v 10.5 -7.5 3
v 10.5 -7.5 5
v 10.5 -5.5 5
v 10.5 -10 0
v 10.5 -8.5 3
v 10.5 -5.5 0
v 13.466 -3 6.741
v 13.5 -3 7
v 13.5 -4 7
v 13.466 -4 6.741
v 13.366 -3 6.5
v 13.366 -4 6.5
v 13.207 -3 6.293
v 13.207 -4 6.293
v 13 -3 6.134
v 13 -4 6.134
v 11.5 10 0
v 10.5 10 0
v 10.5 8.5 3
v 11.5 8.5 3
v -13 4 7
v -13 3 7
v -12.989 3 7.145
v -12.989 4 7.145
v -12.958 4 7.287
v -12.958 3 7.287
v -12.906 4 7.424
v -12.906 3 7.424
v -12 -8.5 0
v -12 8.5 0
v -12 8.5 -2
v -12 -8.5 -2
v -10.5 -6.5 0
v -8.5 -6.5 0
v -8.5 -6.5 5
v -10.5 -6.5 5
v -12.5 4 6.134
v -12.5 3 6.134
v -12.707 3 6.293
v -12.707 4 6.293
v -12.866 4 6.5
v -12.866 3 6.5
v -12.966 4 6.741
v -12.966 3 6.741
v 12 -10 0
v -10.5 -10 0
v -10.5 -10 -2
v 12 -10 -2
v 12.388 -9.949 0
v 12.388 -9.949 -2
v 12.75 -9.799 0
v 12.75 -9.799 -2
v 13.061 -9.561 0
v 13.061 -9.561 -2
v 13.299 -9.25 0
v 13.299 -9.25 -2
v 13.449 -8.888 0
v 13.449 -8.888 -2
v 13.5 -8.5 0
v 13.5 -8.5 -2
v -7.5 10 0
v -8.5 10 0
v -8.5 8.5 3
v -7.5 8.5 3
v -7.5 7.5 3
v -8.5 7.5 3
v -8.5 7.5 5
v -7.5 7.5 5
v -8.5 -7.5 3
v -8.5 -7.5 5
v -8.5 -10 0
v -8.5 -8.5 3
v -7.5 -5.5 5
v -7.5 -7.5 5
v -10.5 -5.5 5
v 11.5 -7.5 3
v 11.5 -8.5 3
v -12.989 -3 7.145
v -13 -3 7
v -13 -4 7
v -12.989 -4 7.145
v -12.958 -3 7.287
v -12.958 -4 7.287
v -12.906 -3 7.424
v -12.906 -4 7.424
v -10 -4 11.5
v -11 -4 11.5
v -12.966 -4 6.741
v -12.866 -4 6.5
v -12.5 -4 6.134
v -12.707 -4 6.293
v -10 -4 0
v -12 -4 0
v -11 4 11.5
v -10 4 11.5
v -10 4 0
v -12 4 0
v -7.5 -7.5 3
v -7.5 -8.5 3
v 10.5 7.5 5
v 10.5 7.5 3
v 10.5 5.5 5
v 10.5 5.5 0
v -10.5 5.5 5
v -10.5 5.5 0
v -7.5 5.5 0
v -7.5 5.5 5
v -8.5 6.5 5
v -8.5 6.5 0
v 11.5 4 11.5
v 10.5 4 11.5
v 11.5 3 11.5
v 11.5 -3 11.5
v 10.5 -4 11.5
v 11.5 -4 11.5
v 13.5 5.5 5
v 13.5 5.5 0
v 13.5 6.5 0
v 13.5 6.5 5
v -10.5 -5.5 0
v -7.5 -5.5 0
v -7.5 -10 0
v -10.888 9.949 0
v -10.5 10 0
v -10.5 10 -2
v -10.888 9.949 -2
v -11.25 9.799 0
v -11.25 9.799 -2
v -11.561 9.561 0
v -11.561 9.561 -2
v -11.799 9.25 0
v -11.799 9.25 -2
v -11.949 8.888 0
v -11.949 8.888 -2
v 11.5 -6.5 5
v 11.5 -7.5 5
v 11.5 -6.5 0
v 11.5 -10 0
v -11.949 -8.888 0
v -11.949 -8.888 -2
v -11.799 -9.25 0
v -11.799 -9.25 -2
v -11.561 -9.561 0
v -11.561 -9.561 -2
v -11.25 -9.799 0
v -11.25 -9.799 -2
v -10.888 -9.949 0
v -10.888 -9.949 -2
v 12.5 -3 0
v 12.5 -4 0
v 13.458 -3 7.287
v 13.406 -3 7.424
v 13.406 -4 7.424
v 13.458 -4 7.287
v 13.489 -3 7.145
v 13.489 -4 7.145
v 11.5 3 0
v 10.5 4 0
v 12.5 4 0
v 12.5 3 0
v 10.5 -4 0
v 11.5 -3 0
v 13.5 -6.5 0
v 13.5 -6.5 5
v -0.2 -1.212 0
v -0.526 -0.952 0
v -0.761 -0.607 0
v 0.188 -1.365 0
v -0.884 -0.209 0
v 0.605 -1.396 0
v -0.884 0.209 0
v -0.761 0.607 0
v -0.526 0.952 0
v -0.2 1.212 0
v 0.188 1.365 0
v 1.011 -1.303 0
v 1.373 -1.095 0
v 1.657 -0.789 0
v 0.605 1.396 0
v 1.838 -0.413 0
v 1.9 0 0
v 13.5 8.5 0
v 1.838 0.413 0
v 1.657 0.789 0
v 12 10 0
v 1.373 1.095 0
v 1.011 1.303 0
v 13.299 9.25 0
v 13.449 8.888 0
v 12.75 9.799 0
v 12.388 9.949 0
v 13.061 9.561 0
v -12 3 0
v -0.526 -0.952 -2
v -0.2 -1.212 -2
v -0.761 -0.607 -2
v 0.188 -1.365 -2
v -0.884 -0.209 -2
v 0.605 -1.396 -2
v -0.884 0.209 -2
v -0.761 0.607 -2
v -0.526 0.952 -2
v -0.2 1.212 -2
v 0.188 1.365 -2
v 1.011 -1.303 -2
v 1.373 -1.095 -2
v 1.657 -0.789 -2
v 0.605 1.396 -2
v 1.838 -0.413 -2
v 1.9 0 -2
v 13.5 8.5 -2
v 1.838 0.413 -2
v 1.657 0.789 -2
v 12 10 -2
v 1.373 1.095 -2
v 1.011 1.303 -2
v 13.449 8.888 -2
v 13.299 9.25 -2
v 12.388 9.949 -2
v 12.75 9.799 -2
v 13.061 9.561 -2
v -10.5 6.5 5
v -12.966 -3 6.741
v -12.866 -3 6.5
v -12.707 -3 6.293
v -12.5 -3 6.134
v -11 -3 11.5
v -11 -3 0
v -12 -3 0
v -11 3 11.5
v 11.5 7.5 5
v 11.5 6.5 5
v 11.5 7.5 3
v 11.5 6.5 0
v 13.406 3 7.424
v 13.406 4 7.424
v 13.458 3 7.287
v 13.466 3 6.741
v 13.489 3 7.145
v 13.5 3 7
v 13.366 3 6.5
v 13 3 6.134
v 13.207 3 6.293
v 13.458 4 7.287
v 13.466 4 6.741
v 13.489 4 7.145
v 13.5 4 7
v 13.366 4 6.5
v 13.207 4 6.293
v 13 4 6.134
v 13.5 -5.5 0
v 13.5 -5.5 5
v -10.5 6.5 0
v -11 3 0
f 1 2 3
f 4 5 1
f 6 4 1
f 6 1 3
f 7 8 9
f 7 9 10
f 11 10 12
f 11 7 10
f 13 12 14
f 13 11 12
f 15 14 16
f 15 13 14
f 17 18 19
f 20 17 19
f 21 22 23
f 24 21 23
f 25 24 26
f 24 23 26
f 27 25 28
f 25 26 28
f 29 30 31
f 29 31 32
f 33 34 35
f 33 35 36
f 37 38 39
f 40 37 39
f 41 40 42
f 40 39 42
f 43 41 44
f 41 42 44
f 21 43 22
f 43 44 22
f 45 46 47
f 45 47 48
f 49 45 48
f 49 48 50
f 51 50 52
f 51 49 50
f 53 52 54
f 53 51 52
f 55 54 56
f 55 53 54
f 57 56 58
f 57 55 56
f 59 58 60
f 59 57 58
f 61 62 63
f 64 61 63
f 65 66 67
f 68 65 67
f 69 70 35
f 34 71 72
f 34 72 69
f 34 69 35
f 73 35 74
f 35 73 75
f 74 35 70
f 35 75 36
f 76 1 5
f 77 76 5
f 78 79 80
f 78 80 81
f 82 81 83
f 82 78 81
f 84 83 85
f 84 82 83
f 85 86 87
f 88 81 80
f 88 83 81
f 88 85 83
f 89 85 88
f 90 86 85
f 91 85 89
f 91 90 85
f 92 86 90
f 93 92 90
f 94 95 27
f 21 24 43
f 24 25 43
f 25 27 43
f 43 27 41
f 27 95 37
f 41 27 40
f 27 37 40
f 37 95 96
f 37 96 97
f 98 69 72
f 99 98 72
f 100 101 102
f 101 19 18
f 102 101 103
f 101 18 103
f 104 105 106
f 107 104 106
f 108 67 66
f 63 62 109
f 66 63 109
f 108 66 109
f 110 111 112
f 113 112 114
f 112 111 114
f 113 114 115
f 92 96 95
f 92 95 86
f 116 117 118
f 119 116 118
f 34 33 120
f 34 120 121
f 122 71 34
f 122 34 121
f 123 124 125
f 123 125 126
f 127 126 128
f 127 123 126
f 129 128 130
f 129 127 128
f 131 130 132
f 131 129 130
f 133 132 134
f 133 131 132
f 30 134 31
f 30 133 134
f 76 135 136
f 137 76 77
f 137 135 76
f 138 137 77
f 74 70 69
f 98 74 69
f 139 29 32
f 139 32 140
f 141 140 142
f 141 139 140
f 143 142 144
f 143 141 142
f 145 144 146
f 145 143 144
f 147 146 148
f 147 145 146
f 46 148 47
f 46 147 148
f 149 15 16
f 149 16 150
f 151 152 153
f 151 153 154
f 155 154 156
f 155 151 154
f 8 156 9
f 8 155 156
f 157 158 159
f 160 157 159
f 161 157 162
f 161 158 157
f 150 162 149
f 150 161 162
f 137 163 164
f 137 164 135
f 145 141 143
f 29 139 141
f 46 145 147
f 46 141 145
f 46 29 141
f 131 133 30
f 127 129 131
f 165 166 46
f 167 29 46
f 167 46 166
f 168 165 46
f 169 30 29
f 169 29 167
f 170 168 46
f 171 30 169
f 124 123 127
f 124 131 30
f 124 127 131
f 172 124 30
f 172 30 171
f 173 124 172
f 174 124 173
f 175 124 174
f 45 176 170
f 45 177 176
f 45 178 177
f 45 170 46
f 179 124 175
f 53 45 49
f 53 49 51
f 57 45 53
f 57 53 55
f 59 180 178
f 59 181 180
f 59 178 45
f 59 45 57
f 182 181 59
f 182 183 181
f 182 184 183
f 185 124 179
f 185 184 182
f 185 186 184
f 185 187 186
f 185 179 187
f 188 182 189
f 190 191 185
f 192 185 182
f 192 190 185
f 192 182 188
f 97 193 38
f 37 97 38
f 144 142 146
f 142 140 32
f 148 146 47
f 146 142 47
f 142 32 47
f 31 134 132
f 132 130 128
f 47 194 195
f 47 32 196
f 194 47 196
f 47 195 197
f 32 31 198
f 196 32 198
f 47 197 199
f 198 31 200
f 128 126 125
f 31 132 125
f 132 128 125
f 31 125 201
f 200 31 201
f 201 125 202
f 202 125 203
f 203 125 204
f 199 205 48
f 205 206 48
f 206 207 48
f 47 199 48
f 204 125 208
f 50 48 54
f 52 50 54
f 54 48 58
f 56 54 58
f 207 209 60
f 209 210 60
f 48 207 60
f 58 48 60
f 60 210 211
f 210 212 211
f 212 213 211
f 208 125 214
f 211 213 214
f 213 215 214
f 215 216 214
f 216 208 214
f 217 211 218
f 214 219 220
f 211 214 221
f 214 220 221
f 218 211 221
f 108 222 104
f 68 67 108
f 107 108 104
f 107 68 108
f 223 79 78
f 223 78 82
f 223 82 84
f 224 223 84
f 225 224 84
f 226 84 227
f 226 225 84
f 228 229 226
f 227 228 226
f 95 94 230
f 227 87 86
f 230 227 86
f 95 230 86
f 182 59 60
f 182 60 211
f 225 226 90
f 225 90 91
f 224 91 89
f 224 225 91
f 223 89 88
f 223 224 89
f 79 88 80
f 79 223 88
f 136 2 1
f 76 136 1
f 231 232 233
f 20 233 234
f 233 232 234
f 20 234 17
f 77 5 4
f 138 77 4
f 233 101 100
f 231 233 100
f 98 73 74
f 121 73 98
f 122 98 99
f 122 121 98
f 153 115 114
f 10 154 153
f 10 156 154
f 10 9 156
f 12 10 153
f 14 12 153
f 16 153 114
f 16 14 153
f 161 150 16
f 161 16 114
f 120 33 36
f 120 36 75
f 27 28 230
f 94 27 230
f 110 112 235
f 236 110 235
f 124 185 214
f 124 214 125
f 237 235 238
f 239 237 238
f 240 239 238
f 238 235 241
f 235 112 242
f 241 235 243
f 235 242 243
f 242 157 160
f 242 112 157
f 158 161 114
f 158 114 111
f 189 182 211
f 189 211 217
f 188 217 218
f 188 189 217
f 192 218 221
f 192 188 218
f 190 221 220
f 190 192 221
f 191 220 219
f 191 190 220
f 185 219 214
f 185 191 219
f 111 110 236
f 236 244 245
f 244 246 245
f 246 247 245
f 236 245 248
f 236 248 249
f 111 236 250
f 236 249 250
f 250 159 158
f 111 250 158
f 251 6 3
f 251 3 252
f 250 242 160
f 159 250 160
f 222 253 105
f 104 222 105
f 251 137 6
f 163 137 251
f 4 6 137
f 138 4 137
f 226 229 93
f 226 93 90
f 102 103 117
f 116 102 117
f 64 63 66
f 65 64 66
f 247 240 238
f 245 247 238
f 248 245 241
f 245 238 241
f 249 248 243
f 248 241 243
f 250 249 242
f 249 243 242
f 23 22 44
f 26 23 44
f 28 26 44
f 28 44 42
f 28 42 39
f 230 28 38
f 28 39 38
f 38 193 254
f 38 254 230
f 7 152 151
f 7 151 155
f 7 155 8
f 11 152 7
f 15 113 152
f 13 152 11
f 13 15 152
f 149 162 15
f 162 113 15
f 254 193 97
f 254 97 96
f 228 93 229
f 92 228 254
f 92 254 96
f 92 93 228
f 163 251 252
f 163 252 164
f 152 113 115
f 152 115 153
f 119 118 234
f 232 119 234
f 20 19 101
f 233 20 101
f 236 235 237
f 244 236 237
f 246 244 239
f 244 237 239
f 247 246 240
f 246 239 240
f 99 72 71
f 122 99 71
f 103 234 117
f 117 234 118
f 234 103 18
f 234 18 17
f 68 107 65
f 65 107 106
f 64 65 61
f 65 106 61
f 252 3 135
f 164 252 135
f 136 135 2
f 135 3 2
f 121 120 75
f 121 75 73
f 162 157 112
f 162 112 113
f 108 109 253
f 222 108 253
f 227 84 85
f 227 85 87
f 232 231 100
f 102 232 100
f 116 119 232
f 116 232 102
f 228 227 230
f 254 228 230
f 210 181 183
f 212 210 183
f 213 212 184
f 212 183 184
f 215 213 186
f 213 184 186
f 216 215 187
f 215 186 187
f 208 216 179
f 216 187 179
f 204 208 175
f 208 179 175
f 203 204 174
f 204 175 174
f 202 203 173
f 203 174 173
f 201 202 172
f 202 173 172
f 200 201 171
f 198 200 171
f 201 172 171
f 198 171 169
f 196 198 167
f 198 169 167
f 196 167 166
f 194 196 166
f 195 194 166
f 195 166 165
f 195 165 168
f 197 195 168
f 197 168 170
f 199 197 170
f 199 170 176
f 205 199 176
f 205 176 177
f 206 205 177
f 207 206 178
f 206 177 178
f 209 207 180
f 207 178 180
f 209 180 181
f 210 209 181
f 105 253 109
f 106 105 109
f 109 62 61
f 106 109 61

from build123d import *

# Parameters (mm, degrees)
F1_DEPTH  = 11.5
F3_DEPTH  = 1
F5_W      = 4.5
F5_H      = 6.5
F6_DEPTH  = 28.13
F8_DEPTH  = 22.001
F10_DEPTH = 22.001
F11_R     = 1.4
F12_DEPTH = 2


with BuildPart() as f1:
    # F0 (on Top) → F1 (new body)
    with BuildSketch(Plane.XY):
        Polygon((-7.5, 5.5), (-7.5, 10), (-8.5, 10), (-8.5, 6.5), (-10.5, 6.5), (-10.5, 5.5), align=None)
        Polygon((-10, 4), (-13, 4), (-13, 3), (-11, 3), (-11, 0), (-10, 0), align=None)
        Polygon((11.5, 10), (10.5, 10), (10.5, 5.5), (13.5, 5.5), (13.5, 6.5), (11.5, 6.5), align=None)
        Polygon((13.5, 4), (10.5, 4), (10.5, 0), (11.5, 0), (11.5, 3), (13.5, 3), align=None)
    extrude(amount=F1_DEPTH)

    # F2 (on face) → F3 (cut, through all)
    with BuildSketch(Plane.XZ.offset(-3)):
        with BuildLine():
            ThreePointArc((-13, 7), (-12.976187, 7.21693), (-12.905882, 7.423529))
            Line((-12.905882, 7.423529), (-11, 11.5))
            Line((-11, 11.5), (-13, 11.5))
            Line((-13, 11.5), (-13, 7))
        make_face()
        with BuildLine():
            ThreePointArc((-12.5, 6.133975), (-12.866025, 6.5), (-13, 7))
            Line((-13, 7), (-13, 0))
            Line((-13, 0), (-12, 0))
            Line((-12, 0), (-12.5, 6.133975))
        make_face()
        with BuildLine():
            Line((11.5, 11.5), (13.405882, 7.423529))
            ThreePointArc((13.405882, 7.423529), (13.476187, 7.21693), (13.5, 7))
            Line((13.5, 7), (13.5, 11.5))
            Line((13.5, 11.5), (11.5, 11.5))
        make_face()
        with BuildLine():
            Line((13.5, 0), (13.5, 7))
            ThreePointArc((13.5, 7), (13.366025, 6.5), (13, 6.133975))
            Line((13, 6.133975), (12.5, 0))
            Line((12.5, 0), (13.5, 0))
        make_face()
    extrude(amount=-F3_DEPTH, mode=Mode.SUBTRACT)

    # F4: F1 across plane


with BuildPart() as f1_1:
    add(f1.part)
    add(f1.part.mirror(Plane.XZ))

    # F5 (on face) → F6 (cut, symmetric)
    with BuildSketch(Plane(origin=(-8.5, 0, 0), x_dir=(0, -1, 0), z_dir=(-1, 0, 0))):
        with Locations((-7.75, 8.25)):
            Rectangle(F5_W, F5_H)
        with Locations((7.75, 8.25)):
            Rectangle(F5_W, F5_H)
    extrude(amount=F6_DEPTH, both=True, mode=Mode.SUBTRACT)

    # F7 (on face) → F8 (cut, through all)
    with BuildSketch(Plane(origin=(-8.5, 0, 0), x_dir=(0, -1, 0), z_dir=(-1, 0, 0))):
        Polygon((-10, 5), (-10, 0), (-8.5, 3), (-7.5, 3), (-7.5, 5), align=None)
    extrude(amount=-F8_DEPTH, mode=Mode.SUBTRACT)

    # F9 (on face) → F10 (cut, through all)
    with BuildSketch(Plane(origin=(-8.5, 0, 0), x_dir=(0, -1, 0), z_dir=(-1, 0, 0))):
        Polygon((8.5, 3), (10, 0), (10, 5), (7.5, 5), (7.5, 3), align=None)
    extrude(amount=-F10_DEPTH, mode=Mode.SUBTRACT)


with BuildPart() as f12:
    # F11 (on Top) → F12 (new body)
    with BuildSketch(Plane.XY):
        with BuildLine():
            Line((12, 10), (-10.5, 10))
            ThreePointArc((-10.5, 10), (-11.56066, 9.56066), (-12, 8.5))
            Line((-12, 8.5), (-12, -8.5))
            ThreePointArc((-12, -8.5), (-11.56066, -9.56066), (-10.5, -10))
            Line((-10.5, -10), (12, -10))
            ThreePointArc((12, -10), (13.06066, -9.56066), (13.5, -8.5))
            Line((13.5, -8.5), (13.5, 8.5))
            ThreePointArc((13.5, 8.5), (13.06066, 9.56066), (12, 10))
        make_face()
        with Locations((0.5, 0)):
            Circle(F11_R, mode=Mode.SUBTRACT)
    extrude(amount=-F12_DEPTH)


solid = Compound([f1_1.part, f12.part])
